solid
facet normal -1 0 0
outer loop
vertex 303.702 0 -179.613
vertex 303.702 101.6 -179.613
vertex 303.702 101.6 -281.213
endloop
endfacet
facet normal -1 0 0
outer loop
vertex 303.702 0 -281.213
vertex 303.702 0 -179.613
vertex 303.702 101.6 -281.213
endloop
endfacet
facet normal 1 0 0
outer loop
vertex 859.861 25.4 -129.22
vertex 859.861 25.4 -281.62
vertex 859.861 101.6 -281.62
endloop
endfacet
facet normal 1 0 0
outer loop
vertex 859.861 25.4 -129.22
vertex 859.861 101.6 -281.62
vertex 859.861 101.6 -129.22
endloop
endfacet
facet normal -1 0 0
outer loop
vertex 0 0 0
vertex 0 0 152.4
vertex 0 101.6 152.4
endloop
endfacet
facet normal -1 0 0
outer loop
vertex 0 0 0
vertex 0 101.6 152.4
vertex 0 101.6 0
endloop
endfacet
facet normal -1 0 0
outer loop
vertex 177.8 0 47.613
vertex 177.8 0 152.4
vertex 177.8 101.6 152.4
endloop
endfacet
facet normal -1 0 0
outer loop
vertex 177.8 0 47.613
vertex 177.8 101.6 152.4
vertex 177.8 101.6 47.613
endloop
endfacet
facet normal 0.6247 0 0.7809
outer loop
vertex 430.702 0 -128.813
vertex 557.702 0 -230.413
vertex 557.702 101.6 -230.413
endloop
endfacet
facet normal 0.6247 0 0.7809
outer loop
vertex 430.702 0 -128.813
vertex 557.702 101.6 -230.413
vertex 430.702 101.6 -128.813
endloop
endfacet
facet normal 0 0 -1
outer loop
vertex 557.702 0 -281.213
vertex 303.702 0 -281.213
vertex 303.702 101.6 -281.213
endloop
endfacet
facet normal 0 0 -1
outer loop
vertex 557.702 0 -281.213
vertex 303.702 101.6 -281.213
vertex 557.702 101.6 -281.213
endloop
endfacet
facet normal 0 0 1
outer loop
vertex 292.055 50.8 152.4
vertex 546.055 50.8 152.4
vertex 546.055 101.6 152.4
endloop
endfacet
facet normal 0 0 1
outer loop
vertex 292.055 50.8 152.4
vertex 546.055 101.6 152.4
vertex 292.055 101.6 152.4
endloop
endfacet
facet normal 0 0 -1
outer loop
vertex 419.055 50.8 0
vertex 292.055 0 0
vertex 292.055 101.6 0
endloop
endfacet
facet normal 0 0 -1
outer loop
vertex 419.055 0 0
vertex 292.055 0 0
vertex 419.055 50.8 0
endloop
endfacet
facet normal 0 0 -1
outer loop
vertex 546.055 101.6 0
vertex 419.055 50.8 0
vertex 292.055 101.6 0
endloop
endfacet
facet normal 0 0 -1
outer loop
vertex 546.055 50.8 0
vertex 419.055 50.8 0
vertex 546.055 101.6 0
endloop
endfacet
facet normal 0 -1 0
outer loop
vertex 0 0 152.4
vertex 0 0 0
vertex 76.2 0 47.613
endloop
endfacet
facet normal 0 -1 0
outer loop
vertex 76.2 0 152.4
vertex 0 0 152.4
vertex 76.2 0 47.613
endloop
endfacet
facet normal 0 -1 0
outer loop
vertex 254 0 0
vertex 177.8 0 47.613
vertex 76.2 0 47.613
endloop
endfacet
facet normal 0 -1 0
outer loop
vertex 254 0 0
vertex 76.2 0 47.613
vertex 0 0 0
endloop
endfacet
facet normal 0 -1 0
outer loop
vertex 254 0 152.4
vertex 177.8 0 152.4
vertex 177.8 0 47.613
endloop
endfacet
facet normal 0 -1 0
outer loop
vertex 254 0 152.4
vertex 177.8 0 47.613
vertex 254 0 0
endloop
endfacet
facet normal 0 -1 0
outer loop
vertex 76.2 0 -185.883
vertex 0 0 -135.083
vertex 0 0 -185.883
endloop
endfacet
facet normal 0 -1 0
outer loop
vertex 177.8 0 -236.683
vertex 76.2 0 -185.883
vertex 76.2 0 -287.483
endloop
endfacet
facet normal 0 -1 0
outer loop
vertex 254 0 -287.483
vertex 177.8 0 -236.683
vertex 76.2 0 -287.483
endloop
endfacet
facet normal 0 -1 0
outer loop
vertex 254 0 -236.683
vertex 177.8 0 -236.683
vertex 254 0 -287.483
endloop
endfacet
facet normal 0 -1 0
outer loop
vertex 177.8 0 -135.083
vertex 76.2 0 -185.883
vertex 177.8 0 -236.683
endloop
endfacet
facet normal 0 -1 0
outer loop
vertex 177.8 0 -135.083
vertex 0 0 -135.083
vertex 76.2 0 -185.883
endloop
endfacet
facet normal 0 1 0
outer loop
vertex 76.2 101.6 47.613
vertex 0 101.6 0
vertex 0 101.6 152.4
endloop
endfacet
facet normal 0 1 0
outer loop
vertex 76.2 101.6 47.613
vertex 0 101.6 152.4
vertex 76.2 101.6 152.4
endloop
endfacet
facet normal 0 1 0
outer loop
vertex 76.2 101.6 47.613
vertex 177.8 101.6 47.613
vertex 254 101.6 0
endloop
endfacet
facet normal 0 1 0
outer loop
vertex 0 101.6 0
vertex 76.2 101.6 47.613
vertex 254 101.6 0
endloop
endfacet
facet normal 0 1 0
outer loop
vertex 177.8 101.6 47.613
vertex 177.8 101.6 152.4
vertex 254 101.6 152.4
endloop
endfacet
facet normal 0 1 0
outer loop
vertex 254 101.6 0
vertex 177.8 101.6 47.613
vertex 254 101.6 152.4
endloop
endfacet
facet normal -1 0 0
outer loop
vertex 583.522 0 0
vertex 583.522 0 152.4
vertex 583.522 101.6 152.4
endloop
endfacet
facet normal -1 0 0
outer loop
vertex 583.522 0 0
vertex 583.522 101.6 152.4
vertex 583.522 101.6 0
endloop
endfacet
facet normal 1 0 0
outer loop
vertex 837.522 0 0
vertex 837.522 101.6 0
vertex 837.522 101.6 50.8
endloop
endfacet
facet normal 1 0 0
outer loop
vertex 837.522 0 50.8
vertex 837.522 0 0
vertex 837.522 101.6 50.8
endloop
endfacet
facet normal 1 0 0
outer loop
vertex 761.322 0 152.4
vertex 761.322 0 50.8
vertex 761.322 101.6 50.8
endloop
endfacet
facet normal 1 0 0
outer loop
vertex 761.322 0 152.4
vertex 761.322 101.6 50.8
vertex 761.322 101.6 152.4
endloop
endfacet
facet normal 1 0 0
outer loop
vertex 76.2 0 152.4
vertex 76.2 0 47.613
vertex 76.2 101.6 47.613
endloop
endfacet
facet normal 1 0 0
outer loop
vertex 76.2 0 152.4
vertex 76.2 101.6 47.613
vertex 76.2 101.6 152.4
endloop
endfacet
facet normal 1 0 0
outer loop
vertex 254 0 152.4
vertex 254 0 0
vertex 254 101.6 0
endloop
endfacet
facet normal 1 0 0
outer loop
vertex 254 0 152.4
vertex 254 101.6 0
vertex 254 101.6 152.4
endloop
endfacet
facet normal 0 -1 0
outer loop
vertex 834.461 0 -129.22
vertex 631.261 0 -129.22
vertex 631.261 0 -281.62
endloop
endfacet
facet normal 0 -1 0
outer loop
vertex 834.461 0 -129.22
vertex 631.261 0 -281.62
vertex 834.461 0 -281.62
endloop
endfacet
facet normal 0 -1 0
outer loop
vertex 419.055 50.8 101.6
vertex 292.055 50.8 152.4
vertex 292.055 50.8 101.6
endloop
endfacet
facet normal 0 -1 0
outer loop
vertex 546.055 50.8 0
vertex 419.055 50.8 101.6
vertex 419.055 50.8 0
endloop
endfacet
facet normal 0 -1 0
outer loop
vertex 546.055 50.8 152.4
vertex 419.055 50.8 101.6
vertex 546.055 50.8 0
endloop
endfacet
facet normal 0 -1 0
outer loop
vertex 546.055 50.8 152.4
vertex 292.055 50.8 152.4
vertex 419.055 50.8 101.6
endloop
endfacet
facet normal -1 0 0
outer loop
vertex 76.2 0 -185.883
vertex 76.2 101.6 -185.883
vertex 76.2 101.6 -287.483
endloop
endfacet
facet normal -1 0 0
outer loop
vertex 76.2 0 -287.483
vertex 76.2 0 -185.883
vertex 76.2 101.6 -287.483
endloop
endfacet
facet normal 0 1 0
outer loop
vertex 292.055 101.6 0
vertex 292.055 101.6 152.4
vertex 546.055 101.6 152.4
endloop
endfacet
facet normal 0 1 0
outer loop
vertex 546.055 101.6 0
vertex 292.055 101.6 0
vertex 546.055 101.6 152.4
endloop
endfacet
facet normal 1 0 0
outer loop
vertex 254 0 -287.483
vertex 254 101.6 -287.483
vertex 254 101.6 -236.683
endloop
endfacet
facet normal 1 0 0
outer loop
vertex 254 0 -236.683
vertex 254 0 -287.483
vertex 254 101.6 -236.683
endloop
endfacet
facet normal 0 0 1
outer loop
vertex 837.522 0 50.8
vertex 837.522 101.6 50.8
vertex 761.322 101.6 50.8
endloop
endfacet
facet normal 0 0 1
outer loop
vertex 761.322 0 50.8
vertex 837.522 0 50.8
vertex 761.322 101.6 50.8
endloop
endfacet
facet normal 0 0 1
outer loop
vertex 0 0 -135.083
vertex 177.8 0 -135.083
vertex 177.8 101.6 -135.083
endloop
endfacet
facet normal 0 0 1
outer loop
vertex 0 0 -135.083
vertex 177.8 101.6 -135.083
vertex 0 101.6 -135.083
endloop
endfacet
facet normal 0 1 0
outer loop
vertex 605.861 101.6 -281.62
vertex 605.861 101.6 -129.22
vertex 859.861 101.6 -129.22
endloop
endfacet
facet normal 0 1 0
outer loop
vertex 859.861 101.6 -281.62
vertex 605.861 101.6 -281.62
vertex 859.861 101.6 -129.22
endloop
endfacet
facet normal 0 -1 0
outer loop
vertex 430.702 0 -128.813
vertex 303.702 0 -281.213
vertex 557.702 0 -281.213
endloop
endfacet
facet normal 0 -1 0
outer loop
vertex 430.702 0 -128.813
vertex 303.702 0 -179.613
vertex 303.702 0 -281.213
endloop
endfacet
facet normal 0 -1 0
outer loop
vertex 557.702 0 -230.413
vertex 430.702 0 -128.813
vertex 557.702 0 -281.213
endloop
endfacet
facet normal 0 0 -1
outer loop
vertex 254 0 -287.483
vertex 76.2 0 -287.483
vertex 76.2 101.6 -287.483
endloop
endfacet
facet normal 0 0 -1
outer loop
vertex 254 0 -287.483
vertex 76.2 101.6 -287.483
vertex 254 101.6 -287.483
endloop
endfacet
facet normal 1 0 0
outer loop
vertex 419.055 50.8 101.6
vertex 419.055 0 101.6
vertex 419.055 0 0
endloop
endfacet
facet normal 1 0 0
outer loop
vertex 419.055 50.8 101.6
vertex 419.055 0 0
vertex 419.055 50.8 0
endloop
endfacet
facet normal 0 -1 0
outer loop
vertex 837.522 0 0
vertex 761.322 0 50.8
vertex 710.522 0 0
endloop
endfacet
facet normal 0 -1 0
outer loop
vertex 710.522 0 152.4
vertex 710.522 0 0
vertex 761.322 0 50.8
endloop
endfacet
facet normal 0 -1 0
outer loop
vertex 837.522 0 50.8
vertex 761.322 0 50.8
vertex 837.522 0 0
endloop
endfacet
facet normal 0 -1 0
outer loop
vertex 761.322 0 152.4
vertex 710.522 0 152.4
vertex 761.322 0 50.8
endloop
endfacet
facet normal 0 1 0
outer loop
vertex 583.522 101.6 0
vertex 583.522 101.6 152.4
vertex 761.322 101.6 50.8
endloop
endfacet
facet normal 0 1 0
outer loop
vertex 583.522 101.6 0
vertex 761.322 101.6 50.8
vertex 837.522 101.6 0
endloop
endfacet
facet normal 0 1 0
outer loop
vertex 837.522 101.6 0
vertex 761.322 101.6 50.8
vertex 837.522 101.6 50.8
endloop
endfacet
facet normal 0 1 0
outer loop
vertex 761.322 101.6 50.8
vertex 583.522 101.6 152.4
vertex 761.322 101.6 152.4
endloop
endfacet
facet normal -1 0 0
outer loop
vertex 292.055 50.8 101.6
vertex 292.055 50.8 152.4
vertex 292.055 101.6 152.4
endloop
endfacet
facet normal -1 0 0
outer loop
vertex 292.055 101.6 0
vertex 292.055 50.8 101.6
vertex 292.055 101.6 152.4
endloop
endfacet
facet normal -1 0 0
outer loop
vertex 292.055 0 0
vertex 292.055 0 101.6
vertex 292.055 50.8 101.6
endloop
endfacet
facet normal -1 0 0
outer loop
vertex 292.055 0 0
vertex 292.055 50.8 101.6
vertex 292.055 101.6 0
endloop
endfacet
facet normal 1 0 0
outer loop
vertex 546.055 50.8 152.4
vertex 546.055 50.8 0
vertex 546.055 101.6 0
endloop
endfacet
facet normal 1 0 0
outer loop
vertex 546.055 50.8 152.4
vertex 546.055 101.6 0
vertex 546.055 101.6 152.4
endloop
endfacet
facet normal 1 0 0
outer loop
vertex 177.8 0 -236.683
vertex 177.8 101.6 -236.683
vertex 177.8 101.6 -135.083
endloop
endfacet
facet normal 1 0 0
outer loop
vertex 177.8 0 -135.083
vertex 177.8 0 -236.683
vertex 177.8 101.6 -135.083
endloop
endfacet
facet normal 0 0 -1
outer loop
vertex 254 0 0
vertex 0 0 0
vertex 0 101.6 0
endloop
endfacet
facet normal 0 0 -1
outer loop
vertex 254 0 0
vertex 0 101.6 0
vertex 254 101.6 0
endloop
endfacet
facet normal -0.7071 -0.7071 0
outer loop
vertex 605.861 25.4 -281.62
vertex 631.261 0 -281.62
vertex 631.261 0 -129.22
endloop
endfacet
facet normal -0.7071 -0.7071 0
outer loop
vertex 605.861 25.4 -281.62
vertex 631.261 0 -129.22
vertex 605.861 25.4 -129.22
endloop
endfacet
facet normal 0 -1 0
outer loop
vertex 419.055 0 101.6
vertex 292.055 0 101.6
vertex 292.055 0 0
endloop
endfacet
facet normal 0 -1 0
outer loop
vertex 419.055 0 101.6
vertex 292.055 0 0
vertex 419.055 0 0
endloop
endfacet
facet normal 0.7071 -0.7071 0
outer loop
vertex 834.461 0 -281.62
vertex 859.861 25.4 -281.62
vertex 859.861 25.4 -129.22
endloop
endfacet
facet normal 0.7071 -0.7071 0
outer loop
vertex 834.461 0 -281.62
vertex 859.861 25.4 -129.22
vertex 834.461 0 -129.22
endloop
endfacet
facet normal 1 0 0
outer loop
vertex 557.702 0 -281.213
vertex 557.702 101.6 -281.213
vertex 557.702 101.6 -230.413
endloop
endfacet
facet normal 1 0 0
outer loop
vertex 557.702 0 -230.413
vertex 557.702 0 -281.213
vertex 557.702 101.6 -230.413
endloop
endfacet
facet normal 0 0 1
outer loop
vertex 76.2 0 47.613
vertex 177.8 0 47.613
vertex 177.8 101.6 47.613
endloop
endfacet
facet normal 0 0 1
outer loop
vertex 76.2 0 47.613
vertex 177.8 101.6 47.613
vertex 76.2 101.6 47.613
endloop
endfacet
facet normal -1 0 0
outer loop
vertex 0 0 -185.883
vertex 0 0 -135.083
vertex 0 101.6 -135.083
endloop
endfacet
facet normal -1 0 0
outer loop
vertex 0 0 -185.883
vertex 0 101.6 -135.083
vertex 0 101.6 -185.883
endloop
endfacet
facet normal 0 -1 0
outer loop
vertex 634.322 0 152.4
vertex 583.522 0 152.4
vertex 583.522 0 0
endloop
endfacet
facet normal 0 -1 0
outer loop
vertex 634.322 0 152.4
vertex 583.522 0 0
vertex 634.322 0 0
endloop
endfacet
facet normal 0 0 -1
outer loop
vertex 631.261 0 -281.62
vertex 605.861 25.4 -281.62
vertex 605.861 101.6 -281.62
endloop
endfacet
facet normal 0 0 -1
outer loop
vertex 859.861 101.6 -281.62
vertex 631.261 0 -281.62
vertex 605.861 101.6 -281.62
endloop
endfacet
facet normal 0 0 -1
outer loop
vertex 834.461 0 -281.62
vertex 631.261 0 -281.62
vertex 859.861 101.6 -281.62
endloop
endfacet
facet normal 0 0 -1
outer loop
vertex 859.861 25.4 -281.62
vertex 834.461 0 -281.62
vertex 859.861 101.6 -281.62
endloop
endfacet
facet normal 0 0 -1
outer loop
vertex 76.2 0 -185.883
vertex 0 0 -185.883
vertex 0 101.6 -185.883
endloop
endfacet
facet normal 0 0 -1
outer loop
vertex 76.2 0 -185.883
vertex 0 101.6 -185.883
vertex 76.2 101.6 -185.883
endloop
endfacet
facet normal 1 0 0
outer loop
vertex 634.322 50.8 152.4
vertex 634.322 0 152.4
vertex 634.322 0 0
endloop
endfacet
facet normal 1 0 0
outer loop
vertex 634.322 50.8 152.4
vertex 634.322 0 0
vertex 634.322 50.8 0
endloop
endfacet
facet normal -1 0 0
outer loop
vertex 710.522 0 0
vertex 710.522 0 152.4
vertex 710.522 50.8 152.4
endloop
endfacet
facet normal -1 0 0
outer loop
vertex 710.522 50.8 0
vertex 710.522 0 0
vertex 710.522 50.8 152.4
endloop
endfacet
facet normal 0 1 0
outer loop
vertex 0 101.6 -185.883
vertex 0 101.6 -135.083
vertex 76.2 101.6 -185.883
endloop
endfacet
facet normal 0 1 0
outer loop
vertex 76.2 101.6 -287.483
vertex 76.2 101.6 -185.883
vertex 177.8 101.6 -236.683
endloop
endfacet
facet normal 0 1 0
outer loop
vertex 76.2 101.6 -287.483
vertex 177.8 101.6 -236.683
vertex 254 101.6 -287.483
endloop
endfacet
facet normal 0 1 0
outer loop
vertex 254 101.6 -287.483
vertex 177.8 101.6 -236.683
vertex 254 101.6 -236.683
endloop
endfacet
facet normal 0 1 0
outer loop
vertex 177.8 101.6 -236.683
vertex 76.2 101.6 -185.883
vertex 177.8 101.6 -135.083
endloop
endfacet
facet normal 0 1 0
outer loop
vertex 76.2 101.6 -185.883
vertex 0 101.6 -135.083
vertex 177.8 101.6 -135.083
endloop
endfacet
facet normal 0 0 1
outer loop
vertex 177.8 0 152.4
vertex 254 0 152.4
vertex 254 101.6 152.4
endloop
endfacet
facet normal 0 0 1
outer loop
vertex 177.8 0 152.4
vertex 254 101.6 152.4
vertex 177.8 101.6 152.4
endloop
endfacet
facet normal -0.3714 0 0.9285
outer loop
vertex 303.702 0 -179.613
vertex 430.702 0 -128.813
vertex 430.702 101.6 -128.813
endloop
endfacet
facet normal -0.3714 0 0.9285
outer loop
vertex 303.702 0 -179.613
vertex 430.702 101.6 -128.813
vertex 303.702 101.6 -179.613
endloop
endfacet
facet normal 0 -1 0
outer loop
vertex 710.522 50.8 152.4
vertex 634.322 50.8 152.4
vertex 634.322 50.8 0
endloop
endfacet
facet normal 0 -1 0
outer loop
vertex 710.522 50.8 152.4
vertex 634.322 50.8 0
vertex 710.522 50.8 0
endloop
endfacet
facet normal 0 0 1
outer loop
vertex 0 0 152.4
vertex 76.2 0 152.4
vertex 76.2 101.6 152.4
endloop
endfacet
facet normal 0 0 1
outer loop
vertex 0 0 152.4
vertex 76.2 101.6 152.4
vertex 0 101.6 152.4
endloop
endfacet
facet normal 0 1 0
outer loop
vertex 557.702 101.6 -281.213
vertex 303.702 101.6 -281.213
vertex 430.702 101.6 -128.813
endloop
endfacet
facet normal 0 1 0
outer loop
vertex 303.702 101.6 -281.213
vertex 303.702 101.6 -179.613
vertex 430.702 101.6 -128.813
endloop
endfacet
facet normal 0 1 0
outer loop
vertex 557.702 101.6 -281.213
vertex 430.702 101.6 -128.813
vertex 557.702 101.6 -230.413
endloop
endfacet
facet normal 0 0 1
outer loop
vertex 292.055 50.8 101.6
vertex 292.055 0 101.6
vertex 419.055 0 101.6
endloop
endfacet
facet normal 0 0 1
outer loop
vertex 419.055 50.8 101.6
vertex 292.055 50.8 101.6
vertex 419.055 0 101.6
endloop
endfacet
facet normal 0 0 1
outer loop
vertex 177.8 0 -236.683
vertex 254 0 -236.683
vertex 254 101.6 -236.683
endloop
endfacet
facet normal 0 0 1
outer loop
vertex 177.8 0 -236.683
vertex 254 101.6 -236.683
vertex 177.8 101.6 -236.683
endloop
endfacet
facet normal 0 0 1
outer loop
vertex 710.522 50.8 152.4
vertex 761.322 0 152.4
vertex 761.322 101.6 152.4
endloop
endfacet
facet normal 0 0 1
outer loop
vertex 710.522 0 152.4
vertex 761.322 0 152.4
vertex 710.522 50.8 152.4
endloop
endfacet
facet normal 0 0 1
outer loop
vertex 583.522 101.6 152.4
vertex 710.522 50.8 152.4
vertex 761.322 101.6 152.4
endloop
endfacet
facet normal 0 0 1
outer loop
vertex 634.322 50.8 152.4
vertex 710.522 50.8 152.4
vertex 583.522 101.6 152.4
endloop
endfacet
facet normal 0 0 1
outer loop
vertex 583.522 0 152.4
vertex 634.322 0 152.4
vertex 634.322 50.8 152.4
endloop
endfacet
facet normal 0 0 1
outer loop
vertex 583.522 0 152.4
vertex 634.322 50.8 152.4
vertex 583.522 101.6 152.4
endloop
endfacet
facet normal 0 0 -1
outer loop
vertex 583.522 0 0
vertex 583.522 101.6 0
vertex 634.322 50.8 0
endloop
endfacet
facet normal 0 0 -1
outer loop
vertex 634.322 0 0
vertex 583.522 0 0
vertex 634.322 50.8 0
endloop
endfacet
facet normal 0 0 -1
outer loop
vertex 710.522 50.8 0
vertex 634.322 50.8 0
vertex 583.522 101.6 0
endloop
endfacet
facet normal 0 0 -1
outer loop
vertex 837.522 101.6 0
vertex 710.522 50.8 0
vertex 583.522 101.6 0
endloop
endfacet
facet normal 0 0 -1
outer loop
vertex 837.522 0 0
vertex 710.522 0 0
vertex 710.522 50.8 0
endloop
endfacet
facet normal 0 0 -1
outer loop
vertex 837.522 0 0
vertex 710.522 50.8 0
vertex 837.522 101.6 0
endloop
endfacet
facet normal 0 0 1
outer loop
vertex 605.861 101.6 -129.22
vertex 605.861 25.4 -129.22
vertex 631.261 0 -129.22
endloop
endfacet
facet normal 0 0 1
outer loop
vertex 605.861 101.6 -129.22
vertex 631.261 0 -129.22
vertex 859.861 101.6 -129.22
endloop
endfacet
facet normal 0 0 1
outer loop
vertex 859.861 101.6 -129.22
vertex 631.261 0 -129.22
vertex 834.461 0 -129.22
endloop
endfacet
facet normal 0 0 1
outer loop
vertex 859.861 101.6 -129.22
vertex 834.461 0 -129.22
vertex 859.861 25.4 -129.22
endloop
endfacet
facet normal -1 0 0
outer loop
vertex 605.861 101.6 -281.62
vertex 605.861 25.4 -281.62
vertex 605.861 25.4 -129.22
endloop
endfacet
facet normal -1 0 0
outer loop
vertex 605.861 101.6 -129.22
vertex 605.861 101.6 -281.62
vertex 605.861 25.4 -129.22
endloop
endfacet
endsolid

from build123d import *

# Parameters (mm, degrees)
F1_DEPTH  = 101.6
F2_W      = 127
F2_H      = 101.6
F3_DEPTH  = 101.6
F4_W      = 127
F4_H      = 50.8
F5_DEPTH  = 152.4
F6_W      = 127
F6_H      = 50.8
F7_DEPTH  = 50.8
F9_DEPTH  = 101.6
F10_W     = 76.2
F10_H     = 50.8
F11_DEPTH = 152.4
F13_DEPTH = 101.6
F15_DEPTH = 101.6
F16_W     = 254
F16_H     = 152.4
F17_DEPTH = 101.6
F19_DEPTH = 152.4
F21_DEPTH = 152.4


with BuildPart() as f1:
    # F0 (on Front) → F1 (new body)
    with BuildSketch(Plane.XZ):
        Polygon((0, 0), (254, 0), (254, 152.4), (177.8, 152.4), (177.8, 47.613418), (76.2, 47.613418), (76.2, 152.4), (0, 152.4), align=None)
    extrude(amount=-F1_DEPTH)


with BuildPart() as f3:
    # F2 (on Front) → F3 (new body)
    with BuildSketch(Plane.XZ):
        Polygon((292.055245, 152.4), (292.055245, 101.6), (419.055245, 101.6), (419.055245, 0), (546.055245, 0), (546.055245, 152.4), align=None)
        with Locations((355.555245, 50.8)):
            Rectangle(F2_W, F2_H)
    extrude(amount=-F3_DEPTH)

    # F4 (on face) → F5 (cut)
    with BuildSketch(Plane.XY.offset(152.4)):
        with Locations((482.555245, 25.4)):
            Rectangle(F4_W, F4_H)
    extrude(amount=-F5_DEPTH, mode=Mode.SUBTRACT)

    # F6 (on face) → F7 (cut)
    with BuildSketch(Plane.XZ):
        with Locations((355.555245, 127)):
            Rectangle(F6_W, F6_H)
    extrude(amount=-F7_DEPTH, mode=Mode.SUBTRACT)


with BuildPart() as f9:
    # F8 (on Front) → F9 (new body)
    with BuildSketch(Plane.XZ):
        Polygon((583.522435, 152.4), (583.522435, 0), (837.522435, 0), (837.522435, 50.8), (761.322435, 50.8), (761.322435, 152.4), align=None)
    extrude(amount=-F9_DEPTH)

    # F10 (on face) → F11 (cut)
    with BuildSketch(Plane.XY.offset(152.4)):
        with Locations((672.422435, 25.4)):
            Rectangle(F10_W, F10_H)
    extrude(amount=-F11_DEPTH, mode=Mode.SUBTRACT)


with BuildPart() as f13:
    # F12 (on Front) → F13 (new body)
    with BuildSketch(Plane.XZ):
        Polygon((177.8, -135.083224), (0, -135.083224), (0, -185.883224), (76.2, -185.883224), (76.2, -287.483224), (254, -287.483224), (254, -236.683224), (177.8, -236.683224), align=None)
    extrude(amount=-F13_DEPTH)


with BuildPart() as f15:
    # F14 (on Front) → F15 (new body)
    with BuildSketch(Plane.XZ):
        Polygon((303.70218, -281.213045), (557.70218, -281.213045), (557.70218, -230.413045), (430.70218, -128.813045), (303.70218, -179.613045), align=None)
    extrude(amount=-F15_DEPTH)


with BuildPart() as f17:
    # F16 (on Front) → F17 (new body)
    with BuildSketch(Plane.XZ):
        with Locations((732.860923, -205.420353)):
            Rectangle(F16_W, F16_H)
    extrude(amount=-F17_DEPTH)

    # F18 (on face) → F19 (cut)
    with BuildSketch(Plane.XY.offset(-129.220353)):
        Polygon((605.860923, 25.4), (605.860923, 0), (631.260923, 0), align=None)
    extrude(amount=-F19_DEPTH, mode=Mode.SUBTRACT)

    # F20 (on face) → F21 (cut)
    with BuildSketch(Plane.XY.offset(-129.220353)):
        Polygon((834.460923, 0), (859.860923, 0), (859.860923, 25.4), align=None)
    extrude(amount=-F21_DEPTH, mode=Mode.SUBTRACT)


solid = Compound([f1.part, f3.part, f9.part, f13.part, f15.part, f17.part])
